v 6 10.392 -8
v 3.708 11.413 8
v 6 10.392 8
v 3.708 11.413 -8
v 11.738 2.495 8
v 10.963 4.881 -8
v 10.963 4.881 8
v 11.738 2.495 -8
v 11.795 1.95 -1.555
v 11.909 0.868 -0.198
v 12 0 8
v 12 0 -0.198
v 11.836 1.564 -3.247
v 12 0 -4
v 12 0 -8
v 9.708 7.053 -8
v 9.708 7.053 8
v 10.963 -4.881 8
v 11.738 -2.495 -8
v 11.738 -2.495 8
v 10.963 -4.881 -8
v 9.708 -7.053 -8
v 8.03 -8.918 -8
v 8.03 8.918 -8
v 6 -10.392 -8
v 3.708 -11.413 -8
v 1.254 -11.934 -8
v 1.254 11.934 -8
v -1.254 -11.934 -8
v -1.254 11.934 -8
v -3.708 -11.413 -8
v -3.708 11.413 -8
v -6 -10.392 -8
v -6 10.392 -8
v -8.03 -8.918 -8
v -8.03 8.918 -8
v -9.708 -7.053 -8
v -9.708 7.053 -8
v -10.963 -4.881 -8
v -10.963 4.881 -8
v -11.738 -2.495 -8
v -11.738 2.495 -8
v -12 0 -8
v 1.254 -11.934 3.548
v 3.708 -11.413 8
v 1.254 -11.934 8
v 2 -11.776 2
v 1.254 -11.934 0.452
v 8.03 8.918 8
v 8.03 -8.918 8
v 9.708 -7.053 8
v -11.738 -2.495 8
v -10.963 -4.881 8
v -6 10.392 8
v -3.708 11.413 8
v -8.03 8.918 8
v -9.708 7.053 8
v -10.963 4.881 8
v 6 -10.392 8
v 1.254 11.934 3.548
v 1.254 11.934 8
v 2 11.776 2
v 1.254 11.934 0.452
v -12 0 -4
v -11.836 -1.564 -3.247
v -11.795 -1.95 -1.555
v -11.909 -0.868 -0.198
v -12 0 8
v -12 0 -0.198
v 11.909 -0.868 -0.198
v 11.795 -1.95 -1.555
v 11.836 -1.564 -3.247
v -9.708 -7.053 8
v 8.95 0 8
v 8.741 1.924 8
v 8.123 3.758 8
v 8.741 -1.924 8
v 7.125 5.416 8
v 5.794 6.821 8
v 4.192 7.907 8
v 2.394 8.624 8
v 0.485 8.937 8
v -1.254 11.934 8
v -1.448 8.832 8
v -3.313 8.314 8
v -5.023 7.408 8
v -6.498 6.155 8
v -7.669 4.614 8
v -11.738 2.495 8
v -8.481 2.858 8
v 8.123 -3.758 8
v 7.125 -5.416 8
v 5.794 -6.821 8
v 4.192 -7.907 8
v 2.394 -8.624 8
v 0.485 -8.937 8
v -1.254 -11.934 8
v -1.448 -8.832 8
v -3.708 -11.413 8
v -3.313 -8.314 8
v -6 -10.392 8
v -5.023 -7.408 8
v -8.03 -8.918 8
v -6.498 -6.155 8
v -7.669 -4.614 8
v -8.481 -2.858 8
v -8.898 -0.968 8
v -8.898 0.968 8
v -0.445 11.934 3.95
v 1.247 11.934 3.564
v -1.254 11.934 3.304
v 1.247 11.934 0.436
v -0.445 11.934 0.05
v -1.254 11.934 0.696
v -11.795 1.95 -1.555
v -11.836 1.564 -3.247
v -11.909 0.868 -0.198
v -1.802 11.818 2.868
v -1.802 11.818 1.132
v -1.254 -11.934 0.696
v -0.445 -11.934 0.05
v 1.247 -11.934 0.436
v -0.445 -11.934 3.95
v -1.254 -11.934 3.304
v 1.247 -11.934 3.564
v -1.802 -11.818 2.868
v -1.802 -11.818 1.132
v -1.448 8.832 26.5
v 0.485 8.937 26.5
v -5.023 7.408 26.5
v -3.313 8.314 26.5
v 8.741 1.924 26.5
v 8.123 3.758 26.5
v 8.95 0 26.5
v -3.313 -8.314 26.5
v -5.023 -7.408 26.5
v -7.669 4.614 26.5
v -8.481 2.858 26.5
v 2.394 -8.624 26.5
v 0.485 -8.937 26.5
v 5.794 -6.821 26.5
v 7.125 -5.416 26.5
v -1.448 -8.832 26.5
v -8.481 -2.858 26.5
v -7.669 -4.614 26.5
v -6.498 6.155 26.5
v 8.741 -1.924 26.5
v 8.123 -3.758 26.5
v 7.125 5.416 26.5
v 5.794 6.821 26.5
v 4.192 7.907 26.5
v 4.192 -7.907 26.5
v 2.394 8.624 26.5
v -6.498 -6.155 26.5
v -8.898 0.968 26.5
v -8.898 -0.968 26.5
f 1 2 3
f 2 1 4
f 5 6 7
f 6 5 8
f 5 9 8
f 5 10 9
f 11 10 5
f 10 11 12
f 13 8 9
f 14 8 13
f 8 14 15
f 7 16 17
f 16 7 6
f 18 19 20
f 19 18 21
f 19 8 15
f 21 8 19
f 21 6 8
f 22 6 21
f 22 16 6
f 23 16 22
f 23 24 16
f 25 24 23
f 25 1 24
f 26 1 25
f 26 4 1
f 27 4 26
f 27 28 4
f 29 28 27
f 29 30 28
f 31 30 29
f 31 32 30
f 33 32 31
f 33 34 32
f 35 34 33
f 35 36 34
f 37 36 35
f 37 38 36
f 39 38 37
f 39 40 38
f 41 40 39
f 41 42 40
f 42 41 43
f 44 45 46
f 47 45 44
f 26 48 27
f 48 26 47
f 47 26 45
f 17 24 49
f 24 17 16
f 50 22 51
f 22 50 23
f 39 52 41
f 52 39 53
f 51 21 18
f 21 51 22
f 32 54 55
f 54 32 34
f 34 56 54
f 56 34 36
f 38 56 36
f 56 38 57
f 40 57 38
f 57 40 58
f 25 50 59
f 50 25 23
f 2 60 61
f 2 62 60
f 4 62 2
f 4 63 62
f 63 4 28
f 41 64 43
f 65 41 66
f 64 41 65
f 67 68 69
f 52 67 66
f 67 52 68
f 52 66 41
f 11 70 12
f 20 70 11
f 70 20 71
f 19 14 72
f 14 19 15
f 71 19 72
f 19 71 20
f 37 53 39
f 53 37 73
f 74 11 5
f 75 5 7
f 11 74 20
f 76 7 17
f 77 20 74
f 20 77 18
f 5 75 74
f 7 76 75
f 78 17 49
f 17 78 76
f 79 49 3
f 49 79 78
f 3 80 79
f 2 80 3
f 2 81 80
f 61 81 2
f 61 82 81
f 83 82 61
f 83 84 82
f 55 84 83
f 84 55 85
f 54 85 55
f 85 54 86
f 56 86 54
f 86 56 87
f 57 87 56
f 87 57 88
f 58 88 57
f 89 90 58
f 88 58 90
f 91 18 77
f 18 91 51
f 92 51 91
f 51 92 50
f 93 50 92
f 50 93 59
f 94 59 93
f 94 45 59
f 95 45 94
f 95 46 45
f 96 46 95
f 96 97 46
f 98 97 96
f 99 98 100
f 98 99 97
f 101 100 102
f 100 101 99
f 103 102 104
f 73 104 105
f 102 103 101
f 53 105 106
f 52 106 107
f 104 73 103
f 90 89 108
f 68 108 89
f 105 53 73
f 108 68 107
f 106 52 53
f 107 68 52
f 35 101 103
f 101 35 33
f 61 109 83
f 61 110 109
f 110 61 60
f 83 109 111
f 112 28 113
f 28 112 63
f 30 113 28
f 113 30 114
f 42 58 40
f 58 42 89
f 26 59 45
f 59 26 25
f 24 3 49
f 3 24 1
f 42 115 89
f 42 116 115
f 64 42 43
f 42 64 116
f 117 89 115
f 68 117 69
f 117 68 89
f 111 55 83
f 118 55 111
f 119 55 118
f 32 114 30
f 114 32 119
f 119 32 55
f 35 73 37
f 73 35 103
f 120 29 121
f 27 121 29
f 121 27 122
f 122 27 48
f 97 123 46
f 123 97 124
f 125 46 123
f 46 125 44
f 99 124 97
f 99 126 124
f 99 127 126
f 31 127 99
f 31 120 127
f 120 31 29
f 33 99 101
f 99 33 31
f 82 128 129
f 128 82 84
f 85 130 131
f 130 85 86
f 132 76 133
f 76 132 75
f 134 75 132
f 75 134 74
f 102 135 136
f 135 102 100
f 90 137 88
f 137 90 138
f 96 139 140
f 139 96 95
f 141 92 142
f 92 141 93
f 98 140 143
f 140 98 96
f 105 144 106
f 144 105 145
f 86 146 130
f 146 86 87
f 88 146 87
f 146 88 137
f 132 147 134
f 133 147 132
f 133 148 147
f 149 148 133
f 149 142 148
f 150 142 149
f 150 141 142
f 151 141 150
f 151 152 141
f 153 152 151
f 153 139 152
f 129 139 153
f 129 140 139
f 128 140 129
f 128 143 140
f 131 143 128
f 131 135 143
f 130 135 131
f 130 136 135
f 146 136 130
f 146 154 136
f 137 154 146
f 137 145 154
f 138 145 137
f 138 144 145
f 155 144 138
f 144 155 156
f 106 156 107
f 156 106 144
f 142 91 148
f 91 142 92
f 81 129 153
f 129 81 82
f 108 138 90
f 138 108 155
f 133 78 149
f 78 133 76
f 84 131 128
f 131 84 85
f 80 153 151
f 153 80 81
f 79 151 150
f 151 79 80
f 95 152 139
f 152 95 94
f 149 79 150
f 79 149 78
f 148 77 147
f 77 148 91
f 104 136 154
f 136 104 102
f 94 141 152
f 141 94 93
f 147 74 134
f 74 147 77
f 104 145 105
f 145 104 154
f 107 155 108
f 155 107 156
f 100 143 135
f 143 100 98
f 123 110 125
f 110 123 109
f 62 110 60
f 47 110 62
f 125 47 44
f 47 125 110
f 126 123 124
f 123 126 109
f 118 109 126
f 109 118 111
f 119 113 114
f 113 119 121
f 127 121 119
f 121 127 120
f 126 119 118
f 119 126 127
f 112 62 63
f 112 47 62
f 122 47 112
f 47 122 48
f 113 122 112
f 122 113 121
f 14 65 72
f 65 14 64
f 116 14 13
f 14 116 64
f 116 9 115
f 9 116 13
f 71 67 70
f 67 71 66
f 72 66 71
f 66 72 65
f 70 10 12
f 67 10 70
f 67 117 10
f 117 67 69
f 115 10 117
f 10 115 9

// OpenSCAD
// file: constants.scad
/*
 * Written by Dermot Tynan, Kalopa Research.
 * GPLv2.
 *
 * This file has all the constants for the OpenWing sail.
 *
 * All dimensions are in mm.
 */
wall_thickness = 3;

cf_mast_outer_dia = 20.85;
cf_mast_inner_dia = 17.90;
cf_mast_insert_len = 20;

mast_cap_dia = 24;
mast_cap_height = 16;
mast_base_x = 24;
mast_base_y = 24;
mast_base_height = 12;
mast_base_grip_off = 8;
mast_base_grip_dia = 3.2;

gooseneck_height = 24;
gooseneck_len = 20;
gooseneck_barrel_dia = 11;
gooseplate_width = 26;

kicker_ring_dia = 18;

attach_pin_dia = 6;
washer_thickness = 0.8;
rigging_line_dia = 4;
// main file
/*
 * Written by Dermot Tynan, Kalopa Research.
 * GPLv2.
 *
 * This is the definition for the five mast supports on the upper
 * leading-edge of the mast, A8 -> A12.
 *
 * All dimensions are in mm.
 */

include <constants.scad>

module masthead()
{
	difference() {
		union() {
			cylinder(r = mast_cap_dia/2, h = mast_cap_height, center = true);
			translate([0, 0, 16.5])
				cylinder(r = cf_mast_inner_dia/2, h = cf_mast_insert_len, center = true);
		}
		translate([0, 0, rigging_line_dia/2]) rotate([90, 0, 0])
				cylinder(r = rigging_line_dia/2, h = mast_cap_dia + 10, center = true);
		translate([0, 0, -rigging_line_dia/2]) rotate([0, 90, 0])
				cylinder(r = rigging_line_dia/2, h = mast_cap_dia + 10, center = true);
	}
}

masthead();
